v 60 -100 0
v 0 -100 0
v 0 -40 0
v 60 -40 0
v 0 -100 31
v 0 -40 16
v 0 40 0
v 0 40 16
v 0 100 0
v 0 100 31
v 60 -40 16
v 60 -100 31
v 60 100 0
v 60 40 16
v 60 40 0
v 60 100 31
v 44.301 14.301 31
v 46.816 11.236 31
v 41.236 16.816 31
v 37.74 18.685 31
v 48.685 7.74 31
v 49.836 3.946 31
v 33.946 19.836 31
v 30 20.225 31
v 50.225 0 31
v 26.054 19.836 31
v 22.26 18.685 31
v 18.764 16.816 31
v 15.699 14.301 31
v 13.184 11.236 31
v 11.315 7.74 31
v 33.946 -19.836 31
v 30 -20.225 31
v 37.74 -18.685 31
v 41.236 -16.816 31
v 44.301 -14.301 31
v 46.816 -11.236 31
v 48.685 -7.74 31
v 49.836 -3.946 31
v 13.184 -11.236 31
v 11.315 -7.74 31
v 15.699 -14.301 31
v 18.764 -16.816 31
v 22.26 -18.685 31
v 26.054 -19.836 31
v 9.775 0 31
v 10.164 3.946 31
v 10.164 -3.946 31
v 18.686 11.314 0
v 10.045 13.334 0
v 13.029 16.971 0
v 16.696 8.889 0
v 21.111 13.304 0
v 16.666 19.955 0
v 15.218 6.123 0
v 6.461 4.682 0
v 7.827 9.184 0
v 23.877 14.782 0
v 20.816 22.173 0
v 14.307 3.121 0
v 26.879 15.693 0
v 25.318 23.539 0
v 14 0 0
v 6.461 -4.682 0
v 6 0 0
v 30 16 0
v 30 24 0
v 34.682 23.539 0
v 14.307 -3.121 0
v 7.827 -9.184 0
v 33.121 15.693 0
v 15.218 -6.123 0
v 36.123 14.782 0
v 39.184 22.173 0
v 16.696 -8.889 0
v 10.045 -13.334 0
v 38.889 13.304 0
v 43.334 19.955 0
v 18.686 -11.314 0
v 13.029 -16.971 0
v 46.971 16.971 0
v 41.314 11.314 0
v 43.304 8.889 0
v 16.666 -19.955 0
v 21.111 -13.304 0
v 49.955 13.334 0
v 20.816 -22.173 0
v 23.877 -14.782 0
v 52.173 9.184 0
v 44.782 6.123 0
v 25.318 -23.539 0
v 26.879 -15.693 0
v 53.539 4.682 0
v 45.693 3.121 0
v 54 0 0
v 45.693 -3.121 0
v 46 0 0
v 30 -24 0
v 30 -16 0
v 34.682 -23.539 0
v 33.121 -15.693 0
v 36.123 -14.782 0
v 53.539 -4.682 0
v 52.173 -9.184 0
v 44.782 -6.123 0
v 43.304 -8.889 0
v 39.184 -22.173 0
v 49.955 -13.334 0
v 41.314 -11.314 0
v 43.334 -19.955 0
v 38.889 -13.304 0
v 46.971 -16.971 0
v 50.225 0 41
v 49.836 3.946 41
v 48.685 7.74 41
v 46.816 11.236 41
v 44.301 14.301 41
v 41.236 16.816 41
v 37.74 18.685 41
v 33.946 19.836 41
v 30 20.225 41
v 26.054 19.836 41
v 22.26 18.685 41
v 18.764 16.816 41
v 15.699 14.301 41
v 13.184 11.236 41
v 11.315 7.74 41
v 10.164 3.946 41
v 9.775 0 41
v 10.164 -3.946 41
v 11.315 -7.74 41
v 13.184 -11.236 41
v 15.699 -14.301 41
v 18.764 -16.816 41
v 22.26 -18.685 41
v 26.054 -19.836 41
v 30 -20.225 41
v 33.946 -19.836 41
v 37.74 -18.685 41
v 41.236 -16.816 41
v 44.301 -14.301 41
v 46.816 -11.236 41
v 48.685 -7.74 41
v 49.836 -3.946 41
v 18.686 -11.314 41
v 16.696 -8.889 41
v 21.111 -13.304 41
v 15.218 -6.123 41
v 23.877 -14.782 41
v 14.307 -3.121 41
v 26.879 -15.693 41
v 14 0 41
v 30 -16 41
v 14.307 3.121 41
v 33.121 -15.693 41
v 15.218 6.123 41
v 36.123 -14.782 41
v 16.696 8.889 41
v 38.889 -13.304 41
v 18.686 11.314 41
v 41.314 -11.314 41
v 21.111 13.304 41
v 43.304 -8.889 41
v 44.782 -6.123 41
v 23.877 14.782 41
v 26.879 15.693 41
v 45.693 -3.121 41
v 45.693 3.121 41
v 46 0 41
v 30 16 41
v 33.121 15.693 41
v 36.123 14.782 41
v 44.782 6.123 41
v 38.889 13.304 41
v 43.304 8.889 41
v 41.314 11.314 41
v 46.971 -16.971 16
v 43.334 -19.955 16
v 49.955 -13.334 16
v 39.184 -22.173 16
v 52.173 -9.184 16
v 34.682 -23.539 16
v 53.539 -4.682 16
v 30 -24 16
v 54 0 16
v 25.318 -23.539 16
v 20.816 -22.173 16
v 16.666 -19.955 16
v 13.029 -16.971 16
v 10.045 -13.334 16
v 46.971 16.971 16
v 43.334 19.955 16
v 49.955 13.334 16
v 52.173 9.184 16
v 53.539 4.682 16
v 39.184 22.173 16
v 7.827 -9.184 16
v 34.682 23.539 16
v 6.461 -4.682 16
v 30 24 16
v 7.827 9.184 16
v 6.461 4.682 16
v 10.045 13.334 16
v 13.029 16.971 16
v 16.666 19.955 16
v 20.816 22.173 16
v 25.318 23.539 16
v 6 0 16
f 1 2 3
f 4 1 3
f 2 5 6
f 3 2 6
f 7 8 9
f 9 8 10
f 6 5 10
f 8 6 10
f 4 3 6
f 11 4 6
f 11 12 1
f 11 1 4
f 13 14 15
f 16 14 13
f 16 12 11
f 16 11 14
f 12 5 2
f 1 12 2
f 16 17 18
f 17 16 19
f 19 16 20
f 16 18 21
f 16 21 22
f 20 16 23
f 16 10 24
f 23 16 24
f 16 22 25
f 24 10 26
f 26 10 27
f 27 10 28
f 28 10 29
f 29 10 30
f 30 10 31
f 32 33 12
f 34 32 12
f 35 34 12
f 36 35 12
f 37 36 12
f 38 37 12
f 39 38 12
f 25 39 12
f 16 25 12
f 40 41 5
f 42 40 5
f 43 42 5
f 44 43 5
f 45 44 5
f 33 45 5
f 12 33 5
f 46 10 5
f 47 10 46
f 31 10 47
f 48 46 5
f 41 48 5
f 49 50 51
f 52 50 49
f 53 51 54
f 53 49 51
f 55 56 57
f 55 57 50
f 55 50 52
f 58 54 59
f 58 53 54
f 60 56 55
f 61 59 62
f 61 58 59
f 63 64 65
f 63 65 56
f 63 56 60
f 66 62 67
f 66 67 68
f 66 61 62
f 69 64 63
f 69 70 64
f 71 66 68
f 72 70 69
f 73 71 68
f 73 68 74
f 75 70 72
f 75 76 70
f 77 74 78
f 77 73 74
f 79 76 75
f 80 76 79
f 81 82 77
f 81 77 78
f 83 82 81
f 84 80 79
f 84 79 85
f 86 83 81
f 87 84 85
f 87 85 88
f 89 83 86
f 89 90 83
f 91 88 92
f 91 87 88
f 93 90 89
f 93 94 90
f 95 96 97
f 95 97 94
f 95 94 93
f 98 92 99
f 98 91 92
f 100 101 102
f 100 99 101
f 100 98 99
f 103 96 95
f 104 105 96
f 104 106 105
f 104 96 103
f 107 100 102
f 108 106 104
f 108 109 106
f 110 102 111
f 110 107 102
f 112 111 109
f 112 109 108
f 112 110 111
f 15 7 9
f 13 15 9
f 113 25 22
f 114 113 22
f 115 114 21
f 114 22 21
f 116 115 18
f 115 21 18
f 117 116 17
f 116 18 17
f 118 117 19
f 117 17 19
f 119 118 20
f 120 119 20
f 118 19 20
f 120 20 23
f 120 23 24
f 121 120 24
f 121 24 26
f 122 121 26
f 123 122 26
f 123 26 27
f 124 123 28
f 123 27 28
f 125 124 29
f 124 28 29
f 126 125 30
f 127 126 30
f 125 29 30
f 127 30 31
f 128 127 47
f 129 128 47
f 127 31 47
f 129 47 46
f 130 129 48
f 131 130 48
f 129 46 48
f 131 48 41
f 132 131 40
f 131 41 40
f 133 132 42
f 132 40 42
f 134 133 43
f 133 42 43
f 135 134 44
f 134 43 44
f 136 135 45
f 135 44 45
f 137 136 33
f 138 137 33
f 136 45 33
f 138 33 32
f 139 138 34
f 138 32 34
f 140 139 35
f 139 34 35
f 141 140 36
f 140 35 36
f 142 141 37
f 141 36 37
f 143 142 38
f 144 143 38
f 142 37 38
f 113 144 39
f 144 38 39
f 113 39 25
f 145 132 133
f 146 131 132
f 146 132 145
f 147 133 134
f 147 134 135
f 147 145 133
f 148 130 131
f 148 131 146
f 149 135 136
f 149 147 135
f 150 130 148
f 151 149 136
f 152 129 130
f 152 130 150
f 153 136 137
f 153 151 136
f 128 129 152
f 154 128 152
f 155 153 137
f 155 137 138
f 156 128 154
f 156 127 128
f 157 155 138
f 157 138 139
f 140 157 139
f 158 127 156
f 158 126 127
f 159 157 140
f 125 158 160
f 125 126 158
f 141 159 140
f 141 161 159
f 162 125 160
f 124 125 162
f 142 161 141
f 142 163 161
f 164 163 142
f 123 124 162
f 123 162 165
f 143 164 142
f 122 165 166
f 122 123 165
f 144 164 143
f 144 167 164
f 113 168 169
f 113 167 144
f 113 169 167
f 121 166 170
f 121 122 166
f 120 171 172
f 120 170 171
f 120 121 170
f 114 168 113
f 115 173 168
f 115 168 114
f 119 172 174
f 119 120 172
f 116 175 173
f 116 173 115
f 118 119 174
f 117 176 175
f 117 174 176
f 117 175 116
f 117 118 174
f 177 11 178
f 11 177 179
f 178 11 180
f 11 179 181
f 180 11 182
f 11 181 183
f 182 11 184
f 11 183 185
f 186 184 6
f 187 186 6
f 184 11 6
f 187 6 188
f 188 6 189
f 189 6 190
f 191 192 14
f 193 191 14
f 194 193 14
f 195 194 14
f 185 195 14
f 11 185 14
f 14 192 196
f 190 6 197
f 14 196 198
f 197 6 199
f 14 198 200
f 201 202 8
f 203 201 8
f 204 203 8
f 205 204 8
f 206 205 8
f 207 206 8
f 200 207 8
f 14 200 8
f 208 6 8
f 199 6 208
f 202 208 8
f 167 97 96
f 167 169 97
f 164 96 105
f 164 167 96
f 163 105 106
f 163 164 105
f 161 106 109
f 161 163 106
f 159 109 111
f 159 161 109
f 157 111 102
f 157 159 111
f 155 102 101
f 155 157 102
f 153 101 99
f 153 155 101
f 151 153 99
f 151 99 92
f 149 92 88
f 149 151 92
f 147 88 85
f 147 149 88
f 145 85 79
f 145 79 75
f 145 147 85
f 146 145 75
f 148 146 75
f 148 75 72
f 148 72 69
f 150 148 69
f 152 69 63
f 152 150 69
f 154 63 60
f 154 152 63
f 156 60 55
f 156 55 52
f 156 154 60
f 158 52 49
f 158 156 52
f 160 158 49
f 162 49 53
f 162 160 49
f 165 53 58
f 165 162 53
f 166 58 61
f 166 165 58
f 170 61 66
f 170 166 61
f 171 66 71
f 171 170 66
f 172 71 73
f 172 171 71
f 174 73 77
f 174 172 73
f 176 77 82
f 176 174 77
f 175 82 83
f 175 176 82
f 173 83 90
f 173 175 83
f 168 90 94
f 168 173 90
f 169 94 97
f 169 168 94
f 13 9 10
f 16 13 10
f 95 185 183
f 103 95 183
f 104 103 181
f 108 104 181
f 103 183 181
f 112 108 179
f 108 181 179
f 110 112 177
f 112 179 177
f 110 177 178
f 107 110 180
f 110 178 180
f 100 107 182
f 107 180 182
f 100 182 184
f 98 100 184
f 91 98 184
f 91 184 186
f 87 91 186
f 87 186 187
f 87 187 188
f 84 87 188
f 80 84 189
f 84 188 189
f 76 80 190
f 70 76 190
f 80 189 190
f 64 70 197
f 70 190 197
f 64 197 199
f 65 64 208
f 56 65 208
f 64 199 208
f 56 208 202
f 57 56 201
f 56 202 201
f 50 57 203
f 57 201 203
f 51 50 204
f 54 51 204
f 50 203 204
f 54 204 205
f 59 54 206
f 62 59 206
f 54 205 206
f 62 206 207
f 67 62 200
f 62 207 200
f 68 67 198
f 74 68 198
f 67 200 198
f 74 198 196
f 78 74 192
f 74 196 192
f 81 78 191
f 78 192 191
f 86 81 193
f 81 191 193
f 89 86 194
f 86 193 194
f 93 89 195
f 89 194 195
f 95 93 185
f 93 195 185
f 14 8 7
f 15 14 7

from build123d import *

# Parameters (mm, degrees)
F1_DEPTH = 60
F2_R     = 16
F3_DEPTH = 25
F4_R     = 20.225
F4_R_2   = 16
F5_DEPTH = 10
F6_R     = 24
F6_R_2   = 16
F7_DEPTH = 16


with BuildPart() as f1:
    # F0 (on Right) → F1 (new body)
    with BuildSketch(Plane.YZ):
        Polygon((-100, 31), (-100, 0), (-40, 0), (-40, 16), (0, 16), (40, 16), (40, 0), (100, 0), (100, 31), align=None)
    extrude(amount=F1_DEPTH)

    # F2 (on face) → F3 (cut)
    with BuildSketch(Plane.XY.offset(31)):
        with Locations((30, 0)):
            Circle(F2_R)
    extrude(amount=-F3_DEPTH, mode=Mode.SUBTRACT)

    # F4 (on face) → F5 (join)
    with BuildSketch(Plane.XY.offset(31)):
        with Locations((30, 0)):
            Circle(F4_R)
        with Locations((30, 0)):
            Circle(F4_R_2, mode=Mode.SUBTRACT)
    extrude(amount=F5_DEPTH)

    # F6 (on face) → F7 (join)
    with BuildSketch(Plane(origin=(0, 0, 16), x_dir=(1, 0, 0), z_dir=(0, 0, -1))):
        with Locations((30, 0)):
            Circle(F6_R)
        with Locations((30, 0)):
            Circle(F6_R_2, mode=Mode.SUBTRACT)
    extrude(amount=F7_DEPTH)


solid = f1.part
